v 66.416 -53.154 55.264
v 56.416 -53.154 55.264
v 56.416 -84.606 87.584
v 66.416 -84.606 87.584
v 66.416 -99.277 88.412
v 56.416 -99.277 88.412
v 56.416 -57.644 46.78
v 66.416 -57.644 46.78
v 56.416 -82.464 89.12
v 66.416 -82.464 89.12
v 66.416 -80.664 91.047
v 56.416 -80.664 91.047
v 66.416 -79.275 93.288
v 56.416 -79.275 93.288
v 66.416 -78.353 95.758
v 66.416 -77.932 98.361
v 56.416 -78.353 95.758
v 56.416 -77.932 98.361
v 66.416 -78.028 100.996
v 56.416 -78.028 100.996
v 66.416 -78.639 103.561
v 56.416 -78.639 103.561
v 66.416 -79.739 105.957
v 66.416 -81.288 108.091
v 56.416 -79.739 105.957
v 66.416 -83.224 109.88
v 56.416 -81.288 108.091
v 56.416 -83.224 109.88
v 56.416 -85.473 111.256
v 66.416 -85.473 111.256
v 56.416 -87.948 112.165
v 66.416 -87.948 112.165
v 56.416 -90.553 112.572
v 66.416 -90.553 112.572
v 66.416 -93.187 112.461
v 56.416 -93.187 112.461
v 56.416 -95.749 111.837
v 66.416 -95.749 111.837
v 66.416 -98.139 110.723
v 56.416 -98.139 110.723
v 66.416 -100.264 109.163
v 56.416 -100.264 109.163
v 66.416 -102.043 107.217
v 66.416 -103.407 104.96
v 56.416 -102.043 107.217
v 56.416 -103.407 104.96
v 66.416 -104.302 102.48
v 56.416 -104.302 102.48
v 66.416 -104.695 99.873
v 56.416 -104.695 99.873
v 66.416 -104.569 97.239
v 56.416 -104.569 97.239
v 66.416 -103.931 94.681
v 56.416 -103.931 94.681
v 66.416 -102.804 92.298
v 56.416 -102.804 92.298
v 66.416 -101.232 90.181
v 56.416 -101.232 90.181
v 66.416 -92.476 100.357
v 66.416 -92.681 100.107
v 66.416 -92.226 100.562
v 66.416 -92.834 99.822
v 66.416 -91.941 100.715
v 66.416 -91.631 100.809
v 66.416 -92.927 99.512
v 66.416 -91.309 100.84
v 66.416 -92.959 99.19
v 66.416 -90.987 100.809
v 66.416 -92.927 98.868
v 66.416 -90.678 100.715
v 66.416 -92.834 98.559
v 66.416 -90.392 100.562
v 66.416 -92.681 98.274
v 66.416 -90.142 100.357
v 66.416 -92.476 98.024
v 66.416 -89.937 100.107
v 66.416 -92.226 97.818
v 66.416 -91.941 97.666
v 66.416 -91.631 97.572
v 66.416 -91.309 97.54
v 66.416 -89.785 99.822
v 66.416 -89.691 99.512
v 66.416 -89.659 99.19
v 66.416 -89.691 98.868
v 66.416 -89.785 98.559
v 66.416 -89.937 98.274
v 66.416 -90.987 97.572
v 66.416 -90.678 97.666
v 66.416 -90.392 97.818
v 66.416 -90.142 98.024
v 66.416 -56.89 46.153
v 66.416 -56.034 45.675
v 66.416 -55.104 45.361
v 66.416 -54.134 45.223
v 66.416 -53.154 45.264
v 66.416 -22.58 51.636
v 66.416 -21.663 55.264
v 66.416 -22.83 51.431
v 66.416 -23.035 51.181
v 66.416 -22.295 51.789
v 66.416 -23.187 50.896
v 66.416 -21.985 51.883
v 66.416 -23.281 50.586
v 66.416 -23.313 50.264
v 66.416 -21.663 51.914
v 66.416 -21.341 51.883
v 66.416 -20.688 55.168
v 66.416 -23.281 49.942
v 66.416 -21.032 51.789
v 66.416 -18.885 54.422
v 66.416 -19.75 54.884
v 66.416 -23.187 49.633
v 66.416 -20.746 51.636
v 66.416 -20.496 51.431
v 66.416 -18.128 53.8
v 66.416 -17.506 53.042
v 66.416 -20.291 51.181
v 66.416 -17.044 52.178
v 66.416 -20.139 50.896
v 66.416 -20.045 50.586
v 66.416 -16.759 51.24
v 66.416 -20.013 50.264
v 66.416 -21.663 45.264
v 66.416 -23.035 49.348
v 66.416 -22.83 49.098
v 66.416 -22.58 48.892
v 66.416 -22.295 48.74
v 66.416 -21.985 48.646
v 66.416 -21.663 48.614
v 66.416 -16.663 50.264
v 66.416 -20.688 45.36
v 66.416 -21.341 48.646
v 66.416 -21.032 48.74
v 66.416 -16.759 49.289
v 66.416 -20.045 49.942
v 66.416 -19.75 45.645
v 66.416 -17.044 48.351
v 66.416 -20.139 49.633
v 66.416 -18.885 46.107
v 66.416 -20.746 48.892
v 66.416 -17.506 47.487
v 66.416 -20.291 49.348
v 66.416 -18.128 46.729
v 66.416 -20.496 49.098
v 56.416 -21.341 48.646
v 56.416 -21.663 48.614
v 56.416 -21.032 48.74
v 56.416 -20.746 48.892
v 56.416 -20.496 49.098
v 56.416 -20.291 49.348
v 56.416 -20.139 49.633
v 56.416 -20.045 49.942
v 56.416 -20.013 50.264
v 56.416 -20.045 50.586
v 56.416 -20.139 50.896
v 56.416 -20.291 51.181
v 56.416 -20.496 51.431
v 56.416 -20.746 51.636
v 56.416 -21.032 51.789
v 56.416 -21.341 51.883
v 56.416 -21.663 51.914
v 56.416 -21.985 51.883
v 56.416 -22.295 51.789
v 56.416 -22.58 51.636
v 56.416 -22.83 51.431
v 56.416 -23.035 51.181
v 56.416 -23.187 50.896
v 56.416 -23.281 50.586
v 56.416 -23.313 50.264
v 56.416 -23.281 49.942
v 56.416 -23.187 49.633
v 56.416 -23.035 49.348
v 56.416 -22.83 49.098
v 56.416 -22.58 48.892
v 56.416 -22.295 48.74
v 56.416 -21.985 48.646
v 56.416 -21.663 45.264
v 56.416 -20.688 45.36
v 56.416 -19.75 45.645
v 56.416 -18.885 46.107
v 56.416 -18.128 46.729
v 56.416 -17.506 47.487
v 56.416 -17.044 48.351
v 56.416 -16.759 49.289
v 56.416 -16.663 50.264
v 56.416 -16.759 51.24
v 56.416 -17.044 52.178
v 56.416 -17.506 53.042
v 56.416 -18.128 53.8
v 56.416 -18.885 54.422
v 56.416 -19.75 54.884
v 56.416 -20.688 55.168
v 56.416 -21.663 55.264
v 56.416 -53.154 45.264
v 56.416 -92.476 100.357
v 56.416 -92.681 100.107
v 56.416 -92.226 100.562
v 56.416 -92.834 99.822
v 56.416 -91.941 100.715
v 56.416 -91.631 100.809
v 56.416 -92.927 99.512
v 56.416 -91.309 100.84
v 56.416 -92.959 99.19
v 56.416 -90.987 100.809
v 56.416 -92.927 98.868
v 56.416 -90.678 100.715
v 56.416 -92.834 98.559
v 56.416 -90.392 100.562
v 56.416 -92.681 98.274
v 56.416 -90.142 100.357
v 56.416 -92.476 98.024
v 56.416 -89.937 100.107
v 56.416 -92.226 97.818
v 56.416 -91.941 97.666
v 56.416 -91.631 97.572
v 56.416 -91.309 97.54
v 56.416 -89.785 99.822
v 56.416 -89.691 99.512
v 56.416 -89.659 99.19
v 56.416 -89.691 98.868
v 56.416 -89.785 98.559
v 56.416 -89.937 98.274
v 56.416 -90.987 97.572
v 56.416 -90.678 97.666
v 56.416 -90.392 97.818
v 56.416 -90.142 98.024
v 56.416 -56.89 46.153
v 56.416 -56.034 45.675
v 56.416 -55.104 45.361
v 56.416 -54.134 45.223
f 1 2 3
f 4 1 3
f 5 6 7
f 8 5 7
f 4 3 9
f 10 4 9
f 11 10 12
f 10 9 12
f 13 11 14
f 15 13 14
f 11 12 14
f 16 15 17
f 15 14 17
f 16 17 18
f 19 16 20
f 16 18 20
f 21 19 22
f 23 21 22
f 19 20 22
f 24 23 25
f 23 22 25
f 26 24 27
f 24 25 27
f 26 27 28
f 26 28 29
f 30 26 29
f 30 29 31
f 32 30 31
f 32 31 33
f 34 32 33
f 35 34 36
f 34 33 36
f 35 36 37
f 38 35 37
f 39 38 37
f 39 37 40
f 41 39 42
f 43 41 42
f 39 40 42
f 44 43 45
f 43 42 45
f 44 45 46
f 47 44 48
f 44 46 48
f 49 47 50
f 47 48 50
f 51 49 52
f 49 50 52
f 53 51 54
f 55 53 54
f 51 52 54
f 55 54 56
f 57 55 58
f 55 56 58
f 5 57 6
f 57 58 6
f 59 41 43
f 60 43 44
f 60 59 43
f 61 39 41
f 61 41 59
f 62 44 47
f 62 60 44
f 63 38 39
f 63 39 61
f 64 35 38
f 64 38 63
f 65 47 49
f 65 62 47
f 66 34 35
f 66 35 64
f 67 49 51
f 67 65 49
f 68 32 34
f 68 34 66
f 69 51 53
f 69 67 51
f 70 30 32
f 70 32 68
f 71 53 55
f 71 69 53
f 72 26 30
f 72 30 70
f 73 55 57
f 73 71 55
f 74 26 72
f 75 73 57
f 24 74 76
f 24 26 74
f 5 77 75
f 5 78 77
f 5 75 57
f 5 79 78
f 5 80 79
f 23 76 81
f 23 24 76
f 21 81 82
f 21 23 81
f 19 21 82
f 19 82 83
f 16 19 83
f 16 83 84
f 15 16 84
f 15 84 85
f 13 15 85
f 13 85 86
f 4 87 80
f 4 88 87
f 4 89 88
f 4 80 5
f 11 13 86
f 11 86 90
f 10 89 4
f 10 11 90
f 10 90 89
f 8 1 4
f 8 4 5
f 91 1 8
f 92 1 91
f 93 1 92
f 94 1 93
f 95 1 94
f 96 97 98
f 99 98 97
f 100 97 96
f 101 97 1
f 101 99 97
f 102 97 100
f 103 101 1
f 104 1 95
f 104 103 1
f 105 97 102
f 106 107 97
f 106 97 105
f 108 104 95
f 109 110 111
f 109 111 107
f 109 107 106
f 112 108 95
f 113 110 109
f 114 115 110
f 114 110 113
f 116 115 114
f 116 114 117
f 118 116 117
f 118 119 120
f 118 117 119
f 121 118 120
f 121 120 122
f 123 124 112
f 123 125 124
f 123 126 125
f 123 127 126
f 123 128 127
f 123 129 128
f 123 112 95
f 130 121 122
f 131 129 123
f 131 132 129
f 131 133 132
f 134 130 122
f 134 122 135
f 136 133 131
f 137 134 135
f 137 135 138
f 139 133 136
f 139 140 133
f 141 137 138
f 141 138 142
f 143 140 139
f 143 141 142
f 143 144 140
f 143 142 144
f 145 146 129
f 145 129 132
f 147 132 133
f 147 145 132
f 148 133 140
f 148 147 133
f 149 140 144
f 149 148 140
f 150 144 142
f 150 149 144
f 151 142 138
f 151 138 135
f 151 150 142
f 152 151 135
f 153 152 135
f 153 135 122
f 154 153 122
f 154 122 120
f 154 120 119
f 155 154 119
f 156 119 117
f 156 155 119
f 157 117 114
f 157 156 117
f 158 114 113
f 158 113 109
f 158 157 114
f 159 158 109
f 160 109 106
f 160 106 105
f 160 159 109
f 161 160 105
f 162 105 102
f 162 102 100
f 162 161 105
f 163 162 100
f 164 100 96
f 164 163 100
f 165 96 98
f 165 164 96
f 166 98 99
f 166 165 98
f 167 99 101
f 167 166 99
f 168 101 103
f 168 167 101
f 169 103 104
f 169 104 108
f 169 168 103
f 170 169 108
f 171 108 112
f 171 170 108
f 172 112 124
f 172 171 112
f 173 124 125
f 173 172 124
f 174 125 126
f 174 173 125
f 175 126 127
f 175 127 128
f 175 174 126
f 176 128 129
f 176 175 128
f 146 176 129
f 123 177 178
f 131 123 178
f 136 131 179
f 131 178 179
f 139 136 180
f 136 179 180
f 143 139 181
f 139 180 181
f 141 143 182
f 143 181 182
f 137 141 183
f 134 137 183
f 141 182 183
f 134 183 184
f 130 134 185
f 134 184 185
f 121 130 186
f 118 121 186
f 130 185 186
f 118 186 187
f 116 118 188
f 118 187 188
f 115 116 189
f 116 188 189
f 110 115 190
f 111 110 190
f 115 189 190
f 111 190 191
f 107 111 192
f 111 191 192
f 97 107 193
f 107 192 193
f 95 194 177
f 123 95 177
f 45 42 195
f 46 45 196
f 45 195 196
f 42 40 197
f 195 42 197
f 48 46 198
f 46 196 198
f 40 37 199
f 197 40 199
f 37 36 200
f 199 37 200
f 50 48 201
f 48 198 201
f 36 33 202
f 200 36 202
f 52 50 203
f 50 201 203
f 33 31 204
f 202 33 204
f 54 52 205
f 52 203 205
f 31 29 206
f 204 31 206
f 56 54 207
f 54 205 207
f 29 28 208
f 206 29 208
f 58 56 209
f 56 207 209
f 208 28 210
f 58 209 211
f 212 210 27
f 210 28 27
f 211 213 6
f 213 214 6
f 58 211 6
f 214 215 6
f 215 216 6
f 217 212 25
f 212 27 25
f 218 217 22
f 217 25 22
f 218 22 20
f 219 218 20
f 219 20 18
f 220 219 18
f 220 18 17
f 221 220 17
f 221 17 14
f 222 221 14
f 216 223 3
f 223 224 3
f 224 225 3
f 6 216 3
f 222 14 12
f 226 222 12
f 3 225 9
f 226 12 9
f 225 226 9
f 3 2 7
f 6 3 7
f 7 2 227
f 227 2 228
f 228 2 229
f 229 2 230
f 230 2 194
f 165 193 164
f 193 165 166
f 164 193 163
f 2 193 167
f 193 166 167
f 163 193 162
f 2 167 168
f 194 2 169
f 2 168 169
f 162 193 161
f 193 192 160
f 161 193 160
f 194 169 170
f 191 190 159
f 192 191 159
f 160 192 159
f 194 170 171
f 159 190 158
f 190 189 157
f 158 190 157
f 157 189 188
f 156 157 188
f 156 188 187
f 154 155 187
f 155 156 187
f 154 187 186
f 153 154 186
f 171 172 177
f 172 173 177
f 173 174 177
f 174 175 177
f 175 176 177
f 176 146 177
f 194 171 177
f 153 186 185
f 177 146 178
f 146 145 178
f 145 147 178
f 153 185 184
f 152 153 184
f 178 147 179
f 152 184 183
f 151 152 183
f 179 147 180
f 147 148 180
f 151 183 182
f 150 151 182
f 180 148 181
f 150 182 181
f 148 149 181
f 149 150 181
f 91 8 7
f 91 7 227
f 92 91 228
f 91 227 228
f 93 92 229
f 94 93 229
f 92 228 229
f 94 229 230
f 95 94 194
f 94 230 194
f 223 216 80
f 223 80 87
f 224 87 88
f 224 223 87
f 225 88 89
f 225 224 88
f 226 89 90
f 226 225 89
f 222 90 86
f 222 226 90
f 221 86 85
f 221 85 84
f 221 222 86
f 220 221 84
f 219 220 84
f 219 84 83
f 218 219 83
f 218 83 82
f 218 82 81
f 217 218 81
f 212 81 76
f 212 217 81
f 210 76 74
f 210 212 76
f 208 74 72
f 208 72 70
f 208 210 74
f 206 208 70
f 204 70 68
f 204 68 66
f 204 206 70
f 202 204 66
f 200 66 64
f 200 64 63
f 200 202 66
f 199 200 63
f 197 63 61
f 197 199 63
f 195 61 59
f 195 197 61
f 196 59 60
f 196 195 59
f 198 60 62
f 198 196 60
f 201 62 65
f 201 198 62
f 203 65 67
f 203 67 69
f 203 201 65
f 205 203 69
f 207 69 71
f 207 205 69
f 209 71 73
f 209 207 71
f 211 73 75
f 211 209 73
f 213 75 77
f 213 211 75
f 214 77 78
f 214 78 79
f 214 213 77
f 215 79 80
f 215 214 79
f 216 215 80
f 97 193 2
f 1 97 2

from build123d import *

# Parameters (mm, degrees)
SKETCH_1_R      = 1.65
EXTRUDE_1_DEPTH = 10


with BuildPart() as part:
    # 草图1 → 凸台-拉伸1 (new body)
    with BuildSketch(Plane(origin=(56.415924247, 0, 0), x_dir=(0, 0, -1), z_dir=(1, 0, 0))):
        with BuildLine():
            Line((-55.264392442, -53.153642626), (-87.583702197, -84.606168615))
            ThreePointArc((-87.583702197, -84.606168615), (-112.572118878, -90.553138734), (-88.412490375, -99.276657086))
            Line((-88.412490375, -99.276657086), (-46.780021188, -57.644187899))
            ThreePointArc((-46.780021188, -57.644187899), (-45.496623318, -55.576307852), (-45.264392442, -53.153642626))
            Line((-45.264392442, -53.153642626), (-45.264392442, -21.663090289))
            ThreePointArc((-45.264392442, -21.663090289), (-50.264392442, -16.663090289), (-55.264392442, -21.663090289))
            Line((-55.264392442, -21.663090289), (-55.264392442, -53.153642626))
        make_face()
        with Locations((-50.264392442, -21.663090289)):
            Circle(SKETCH_1_R, mode=Mode.SUBTRACT)
        with Locations((-99.19033753, -91.309123254)):
            Circle(SKETCH_1_R, mode=Mode.SUBTRACT)
    extrude(amount=EXTRUDE_1_DEPTH)


solid = part.part
